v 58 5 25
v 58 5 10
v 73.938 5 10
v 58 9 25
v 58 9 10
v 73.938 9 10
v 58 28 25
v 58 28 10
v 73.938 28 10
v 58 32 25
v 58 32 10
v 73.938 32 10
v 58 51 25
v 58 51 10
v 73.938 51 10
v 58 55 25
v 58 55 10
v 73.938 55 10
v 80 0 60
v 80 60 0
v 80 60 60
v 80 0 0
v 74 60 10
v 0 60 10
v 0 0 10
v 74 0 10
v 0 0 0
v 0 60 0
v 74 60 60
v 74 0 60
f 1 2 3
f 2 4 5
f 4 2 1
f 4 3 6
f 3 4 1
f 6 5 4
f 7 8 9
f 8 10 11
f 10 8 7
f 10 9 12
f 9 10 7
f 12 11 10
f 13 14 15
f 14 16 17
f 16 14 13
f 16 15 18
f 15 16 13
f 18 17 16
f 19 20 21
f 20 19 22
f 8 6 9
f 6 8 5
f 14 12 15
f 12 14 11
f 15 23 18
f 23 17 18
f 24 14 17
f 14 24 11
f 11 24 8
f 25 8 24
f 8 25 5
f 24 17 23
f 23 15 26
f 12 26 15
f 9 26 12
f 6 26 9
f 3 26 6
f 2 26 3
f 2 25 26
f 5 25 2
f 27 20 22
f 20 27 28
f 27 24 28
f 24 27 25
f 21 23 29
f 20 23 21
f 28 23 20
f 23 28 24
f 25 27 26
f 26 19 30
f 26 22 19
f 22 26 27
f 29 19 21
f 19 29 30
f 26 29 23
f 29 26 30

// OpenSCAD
$fn = 32;

// ----------------------------------------------------------------------
// Rib bracket: 3-gusset L bracket
// ----------------------------------------------------------------------

// --- parameters (mm) ---
base_l = 80;              // foot length, X
base_w = 60;              // foot width, Y
base_t = 10;              // foot thickness
plate_t = 6;              // upright plate thickness
plate_h = 60;             // overall height
gus_l = 16;               // gusset leg along the foot
gus_h = 16;               // gusset height
gus_t = 4;                // gusset thickness
gus_edge = 5;             // gusset margin from the foot edge
n_gus = 3;                // gusset count

gus_pitch = (base_w - 2 * gus_edge - gus_t) / (n_gus - 1);  // gusset pitch

union() {
  cube([base_l, base_w, base_t]);
  translate([base_l - plate_t, 0, base_t - 1])
    cube([plate_t, base_w, plate_h - base_t + 1]);
  for (i = [0 : n_gus - 1])
    translate([base_l - plate_t - gus_l, gus_edge + i * gus_pitch, base_t - 1])
      rotate([-90, 0, 0])
        linear_extrude(height = gus_t)
          polygon(points = [[0, 0], [gus_l + 1, 0], [0, -gus_h]]);
}
